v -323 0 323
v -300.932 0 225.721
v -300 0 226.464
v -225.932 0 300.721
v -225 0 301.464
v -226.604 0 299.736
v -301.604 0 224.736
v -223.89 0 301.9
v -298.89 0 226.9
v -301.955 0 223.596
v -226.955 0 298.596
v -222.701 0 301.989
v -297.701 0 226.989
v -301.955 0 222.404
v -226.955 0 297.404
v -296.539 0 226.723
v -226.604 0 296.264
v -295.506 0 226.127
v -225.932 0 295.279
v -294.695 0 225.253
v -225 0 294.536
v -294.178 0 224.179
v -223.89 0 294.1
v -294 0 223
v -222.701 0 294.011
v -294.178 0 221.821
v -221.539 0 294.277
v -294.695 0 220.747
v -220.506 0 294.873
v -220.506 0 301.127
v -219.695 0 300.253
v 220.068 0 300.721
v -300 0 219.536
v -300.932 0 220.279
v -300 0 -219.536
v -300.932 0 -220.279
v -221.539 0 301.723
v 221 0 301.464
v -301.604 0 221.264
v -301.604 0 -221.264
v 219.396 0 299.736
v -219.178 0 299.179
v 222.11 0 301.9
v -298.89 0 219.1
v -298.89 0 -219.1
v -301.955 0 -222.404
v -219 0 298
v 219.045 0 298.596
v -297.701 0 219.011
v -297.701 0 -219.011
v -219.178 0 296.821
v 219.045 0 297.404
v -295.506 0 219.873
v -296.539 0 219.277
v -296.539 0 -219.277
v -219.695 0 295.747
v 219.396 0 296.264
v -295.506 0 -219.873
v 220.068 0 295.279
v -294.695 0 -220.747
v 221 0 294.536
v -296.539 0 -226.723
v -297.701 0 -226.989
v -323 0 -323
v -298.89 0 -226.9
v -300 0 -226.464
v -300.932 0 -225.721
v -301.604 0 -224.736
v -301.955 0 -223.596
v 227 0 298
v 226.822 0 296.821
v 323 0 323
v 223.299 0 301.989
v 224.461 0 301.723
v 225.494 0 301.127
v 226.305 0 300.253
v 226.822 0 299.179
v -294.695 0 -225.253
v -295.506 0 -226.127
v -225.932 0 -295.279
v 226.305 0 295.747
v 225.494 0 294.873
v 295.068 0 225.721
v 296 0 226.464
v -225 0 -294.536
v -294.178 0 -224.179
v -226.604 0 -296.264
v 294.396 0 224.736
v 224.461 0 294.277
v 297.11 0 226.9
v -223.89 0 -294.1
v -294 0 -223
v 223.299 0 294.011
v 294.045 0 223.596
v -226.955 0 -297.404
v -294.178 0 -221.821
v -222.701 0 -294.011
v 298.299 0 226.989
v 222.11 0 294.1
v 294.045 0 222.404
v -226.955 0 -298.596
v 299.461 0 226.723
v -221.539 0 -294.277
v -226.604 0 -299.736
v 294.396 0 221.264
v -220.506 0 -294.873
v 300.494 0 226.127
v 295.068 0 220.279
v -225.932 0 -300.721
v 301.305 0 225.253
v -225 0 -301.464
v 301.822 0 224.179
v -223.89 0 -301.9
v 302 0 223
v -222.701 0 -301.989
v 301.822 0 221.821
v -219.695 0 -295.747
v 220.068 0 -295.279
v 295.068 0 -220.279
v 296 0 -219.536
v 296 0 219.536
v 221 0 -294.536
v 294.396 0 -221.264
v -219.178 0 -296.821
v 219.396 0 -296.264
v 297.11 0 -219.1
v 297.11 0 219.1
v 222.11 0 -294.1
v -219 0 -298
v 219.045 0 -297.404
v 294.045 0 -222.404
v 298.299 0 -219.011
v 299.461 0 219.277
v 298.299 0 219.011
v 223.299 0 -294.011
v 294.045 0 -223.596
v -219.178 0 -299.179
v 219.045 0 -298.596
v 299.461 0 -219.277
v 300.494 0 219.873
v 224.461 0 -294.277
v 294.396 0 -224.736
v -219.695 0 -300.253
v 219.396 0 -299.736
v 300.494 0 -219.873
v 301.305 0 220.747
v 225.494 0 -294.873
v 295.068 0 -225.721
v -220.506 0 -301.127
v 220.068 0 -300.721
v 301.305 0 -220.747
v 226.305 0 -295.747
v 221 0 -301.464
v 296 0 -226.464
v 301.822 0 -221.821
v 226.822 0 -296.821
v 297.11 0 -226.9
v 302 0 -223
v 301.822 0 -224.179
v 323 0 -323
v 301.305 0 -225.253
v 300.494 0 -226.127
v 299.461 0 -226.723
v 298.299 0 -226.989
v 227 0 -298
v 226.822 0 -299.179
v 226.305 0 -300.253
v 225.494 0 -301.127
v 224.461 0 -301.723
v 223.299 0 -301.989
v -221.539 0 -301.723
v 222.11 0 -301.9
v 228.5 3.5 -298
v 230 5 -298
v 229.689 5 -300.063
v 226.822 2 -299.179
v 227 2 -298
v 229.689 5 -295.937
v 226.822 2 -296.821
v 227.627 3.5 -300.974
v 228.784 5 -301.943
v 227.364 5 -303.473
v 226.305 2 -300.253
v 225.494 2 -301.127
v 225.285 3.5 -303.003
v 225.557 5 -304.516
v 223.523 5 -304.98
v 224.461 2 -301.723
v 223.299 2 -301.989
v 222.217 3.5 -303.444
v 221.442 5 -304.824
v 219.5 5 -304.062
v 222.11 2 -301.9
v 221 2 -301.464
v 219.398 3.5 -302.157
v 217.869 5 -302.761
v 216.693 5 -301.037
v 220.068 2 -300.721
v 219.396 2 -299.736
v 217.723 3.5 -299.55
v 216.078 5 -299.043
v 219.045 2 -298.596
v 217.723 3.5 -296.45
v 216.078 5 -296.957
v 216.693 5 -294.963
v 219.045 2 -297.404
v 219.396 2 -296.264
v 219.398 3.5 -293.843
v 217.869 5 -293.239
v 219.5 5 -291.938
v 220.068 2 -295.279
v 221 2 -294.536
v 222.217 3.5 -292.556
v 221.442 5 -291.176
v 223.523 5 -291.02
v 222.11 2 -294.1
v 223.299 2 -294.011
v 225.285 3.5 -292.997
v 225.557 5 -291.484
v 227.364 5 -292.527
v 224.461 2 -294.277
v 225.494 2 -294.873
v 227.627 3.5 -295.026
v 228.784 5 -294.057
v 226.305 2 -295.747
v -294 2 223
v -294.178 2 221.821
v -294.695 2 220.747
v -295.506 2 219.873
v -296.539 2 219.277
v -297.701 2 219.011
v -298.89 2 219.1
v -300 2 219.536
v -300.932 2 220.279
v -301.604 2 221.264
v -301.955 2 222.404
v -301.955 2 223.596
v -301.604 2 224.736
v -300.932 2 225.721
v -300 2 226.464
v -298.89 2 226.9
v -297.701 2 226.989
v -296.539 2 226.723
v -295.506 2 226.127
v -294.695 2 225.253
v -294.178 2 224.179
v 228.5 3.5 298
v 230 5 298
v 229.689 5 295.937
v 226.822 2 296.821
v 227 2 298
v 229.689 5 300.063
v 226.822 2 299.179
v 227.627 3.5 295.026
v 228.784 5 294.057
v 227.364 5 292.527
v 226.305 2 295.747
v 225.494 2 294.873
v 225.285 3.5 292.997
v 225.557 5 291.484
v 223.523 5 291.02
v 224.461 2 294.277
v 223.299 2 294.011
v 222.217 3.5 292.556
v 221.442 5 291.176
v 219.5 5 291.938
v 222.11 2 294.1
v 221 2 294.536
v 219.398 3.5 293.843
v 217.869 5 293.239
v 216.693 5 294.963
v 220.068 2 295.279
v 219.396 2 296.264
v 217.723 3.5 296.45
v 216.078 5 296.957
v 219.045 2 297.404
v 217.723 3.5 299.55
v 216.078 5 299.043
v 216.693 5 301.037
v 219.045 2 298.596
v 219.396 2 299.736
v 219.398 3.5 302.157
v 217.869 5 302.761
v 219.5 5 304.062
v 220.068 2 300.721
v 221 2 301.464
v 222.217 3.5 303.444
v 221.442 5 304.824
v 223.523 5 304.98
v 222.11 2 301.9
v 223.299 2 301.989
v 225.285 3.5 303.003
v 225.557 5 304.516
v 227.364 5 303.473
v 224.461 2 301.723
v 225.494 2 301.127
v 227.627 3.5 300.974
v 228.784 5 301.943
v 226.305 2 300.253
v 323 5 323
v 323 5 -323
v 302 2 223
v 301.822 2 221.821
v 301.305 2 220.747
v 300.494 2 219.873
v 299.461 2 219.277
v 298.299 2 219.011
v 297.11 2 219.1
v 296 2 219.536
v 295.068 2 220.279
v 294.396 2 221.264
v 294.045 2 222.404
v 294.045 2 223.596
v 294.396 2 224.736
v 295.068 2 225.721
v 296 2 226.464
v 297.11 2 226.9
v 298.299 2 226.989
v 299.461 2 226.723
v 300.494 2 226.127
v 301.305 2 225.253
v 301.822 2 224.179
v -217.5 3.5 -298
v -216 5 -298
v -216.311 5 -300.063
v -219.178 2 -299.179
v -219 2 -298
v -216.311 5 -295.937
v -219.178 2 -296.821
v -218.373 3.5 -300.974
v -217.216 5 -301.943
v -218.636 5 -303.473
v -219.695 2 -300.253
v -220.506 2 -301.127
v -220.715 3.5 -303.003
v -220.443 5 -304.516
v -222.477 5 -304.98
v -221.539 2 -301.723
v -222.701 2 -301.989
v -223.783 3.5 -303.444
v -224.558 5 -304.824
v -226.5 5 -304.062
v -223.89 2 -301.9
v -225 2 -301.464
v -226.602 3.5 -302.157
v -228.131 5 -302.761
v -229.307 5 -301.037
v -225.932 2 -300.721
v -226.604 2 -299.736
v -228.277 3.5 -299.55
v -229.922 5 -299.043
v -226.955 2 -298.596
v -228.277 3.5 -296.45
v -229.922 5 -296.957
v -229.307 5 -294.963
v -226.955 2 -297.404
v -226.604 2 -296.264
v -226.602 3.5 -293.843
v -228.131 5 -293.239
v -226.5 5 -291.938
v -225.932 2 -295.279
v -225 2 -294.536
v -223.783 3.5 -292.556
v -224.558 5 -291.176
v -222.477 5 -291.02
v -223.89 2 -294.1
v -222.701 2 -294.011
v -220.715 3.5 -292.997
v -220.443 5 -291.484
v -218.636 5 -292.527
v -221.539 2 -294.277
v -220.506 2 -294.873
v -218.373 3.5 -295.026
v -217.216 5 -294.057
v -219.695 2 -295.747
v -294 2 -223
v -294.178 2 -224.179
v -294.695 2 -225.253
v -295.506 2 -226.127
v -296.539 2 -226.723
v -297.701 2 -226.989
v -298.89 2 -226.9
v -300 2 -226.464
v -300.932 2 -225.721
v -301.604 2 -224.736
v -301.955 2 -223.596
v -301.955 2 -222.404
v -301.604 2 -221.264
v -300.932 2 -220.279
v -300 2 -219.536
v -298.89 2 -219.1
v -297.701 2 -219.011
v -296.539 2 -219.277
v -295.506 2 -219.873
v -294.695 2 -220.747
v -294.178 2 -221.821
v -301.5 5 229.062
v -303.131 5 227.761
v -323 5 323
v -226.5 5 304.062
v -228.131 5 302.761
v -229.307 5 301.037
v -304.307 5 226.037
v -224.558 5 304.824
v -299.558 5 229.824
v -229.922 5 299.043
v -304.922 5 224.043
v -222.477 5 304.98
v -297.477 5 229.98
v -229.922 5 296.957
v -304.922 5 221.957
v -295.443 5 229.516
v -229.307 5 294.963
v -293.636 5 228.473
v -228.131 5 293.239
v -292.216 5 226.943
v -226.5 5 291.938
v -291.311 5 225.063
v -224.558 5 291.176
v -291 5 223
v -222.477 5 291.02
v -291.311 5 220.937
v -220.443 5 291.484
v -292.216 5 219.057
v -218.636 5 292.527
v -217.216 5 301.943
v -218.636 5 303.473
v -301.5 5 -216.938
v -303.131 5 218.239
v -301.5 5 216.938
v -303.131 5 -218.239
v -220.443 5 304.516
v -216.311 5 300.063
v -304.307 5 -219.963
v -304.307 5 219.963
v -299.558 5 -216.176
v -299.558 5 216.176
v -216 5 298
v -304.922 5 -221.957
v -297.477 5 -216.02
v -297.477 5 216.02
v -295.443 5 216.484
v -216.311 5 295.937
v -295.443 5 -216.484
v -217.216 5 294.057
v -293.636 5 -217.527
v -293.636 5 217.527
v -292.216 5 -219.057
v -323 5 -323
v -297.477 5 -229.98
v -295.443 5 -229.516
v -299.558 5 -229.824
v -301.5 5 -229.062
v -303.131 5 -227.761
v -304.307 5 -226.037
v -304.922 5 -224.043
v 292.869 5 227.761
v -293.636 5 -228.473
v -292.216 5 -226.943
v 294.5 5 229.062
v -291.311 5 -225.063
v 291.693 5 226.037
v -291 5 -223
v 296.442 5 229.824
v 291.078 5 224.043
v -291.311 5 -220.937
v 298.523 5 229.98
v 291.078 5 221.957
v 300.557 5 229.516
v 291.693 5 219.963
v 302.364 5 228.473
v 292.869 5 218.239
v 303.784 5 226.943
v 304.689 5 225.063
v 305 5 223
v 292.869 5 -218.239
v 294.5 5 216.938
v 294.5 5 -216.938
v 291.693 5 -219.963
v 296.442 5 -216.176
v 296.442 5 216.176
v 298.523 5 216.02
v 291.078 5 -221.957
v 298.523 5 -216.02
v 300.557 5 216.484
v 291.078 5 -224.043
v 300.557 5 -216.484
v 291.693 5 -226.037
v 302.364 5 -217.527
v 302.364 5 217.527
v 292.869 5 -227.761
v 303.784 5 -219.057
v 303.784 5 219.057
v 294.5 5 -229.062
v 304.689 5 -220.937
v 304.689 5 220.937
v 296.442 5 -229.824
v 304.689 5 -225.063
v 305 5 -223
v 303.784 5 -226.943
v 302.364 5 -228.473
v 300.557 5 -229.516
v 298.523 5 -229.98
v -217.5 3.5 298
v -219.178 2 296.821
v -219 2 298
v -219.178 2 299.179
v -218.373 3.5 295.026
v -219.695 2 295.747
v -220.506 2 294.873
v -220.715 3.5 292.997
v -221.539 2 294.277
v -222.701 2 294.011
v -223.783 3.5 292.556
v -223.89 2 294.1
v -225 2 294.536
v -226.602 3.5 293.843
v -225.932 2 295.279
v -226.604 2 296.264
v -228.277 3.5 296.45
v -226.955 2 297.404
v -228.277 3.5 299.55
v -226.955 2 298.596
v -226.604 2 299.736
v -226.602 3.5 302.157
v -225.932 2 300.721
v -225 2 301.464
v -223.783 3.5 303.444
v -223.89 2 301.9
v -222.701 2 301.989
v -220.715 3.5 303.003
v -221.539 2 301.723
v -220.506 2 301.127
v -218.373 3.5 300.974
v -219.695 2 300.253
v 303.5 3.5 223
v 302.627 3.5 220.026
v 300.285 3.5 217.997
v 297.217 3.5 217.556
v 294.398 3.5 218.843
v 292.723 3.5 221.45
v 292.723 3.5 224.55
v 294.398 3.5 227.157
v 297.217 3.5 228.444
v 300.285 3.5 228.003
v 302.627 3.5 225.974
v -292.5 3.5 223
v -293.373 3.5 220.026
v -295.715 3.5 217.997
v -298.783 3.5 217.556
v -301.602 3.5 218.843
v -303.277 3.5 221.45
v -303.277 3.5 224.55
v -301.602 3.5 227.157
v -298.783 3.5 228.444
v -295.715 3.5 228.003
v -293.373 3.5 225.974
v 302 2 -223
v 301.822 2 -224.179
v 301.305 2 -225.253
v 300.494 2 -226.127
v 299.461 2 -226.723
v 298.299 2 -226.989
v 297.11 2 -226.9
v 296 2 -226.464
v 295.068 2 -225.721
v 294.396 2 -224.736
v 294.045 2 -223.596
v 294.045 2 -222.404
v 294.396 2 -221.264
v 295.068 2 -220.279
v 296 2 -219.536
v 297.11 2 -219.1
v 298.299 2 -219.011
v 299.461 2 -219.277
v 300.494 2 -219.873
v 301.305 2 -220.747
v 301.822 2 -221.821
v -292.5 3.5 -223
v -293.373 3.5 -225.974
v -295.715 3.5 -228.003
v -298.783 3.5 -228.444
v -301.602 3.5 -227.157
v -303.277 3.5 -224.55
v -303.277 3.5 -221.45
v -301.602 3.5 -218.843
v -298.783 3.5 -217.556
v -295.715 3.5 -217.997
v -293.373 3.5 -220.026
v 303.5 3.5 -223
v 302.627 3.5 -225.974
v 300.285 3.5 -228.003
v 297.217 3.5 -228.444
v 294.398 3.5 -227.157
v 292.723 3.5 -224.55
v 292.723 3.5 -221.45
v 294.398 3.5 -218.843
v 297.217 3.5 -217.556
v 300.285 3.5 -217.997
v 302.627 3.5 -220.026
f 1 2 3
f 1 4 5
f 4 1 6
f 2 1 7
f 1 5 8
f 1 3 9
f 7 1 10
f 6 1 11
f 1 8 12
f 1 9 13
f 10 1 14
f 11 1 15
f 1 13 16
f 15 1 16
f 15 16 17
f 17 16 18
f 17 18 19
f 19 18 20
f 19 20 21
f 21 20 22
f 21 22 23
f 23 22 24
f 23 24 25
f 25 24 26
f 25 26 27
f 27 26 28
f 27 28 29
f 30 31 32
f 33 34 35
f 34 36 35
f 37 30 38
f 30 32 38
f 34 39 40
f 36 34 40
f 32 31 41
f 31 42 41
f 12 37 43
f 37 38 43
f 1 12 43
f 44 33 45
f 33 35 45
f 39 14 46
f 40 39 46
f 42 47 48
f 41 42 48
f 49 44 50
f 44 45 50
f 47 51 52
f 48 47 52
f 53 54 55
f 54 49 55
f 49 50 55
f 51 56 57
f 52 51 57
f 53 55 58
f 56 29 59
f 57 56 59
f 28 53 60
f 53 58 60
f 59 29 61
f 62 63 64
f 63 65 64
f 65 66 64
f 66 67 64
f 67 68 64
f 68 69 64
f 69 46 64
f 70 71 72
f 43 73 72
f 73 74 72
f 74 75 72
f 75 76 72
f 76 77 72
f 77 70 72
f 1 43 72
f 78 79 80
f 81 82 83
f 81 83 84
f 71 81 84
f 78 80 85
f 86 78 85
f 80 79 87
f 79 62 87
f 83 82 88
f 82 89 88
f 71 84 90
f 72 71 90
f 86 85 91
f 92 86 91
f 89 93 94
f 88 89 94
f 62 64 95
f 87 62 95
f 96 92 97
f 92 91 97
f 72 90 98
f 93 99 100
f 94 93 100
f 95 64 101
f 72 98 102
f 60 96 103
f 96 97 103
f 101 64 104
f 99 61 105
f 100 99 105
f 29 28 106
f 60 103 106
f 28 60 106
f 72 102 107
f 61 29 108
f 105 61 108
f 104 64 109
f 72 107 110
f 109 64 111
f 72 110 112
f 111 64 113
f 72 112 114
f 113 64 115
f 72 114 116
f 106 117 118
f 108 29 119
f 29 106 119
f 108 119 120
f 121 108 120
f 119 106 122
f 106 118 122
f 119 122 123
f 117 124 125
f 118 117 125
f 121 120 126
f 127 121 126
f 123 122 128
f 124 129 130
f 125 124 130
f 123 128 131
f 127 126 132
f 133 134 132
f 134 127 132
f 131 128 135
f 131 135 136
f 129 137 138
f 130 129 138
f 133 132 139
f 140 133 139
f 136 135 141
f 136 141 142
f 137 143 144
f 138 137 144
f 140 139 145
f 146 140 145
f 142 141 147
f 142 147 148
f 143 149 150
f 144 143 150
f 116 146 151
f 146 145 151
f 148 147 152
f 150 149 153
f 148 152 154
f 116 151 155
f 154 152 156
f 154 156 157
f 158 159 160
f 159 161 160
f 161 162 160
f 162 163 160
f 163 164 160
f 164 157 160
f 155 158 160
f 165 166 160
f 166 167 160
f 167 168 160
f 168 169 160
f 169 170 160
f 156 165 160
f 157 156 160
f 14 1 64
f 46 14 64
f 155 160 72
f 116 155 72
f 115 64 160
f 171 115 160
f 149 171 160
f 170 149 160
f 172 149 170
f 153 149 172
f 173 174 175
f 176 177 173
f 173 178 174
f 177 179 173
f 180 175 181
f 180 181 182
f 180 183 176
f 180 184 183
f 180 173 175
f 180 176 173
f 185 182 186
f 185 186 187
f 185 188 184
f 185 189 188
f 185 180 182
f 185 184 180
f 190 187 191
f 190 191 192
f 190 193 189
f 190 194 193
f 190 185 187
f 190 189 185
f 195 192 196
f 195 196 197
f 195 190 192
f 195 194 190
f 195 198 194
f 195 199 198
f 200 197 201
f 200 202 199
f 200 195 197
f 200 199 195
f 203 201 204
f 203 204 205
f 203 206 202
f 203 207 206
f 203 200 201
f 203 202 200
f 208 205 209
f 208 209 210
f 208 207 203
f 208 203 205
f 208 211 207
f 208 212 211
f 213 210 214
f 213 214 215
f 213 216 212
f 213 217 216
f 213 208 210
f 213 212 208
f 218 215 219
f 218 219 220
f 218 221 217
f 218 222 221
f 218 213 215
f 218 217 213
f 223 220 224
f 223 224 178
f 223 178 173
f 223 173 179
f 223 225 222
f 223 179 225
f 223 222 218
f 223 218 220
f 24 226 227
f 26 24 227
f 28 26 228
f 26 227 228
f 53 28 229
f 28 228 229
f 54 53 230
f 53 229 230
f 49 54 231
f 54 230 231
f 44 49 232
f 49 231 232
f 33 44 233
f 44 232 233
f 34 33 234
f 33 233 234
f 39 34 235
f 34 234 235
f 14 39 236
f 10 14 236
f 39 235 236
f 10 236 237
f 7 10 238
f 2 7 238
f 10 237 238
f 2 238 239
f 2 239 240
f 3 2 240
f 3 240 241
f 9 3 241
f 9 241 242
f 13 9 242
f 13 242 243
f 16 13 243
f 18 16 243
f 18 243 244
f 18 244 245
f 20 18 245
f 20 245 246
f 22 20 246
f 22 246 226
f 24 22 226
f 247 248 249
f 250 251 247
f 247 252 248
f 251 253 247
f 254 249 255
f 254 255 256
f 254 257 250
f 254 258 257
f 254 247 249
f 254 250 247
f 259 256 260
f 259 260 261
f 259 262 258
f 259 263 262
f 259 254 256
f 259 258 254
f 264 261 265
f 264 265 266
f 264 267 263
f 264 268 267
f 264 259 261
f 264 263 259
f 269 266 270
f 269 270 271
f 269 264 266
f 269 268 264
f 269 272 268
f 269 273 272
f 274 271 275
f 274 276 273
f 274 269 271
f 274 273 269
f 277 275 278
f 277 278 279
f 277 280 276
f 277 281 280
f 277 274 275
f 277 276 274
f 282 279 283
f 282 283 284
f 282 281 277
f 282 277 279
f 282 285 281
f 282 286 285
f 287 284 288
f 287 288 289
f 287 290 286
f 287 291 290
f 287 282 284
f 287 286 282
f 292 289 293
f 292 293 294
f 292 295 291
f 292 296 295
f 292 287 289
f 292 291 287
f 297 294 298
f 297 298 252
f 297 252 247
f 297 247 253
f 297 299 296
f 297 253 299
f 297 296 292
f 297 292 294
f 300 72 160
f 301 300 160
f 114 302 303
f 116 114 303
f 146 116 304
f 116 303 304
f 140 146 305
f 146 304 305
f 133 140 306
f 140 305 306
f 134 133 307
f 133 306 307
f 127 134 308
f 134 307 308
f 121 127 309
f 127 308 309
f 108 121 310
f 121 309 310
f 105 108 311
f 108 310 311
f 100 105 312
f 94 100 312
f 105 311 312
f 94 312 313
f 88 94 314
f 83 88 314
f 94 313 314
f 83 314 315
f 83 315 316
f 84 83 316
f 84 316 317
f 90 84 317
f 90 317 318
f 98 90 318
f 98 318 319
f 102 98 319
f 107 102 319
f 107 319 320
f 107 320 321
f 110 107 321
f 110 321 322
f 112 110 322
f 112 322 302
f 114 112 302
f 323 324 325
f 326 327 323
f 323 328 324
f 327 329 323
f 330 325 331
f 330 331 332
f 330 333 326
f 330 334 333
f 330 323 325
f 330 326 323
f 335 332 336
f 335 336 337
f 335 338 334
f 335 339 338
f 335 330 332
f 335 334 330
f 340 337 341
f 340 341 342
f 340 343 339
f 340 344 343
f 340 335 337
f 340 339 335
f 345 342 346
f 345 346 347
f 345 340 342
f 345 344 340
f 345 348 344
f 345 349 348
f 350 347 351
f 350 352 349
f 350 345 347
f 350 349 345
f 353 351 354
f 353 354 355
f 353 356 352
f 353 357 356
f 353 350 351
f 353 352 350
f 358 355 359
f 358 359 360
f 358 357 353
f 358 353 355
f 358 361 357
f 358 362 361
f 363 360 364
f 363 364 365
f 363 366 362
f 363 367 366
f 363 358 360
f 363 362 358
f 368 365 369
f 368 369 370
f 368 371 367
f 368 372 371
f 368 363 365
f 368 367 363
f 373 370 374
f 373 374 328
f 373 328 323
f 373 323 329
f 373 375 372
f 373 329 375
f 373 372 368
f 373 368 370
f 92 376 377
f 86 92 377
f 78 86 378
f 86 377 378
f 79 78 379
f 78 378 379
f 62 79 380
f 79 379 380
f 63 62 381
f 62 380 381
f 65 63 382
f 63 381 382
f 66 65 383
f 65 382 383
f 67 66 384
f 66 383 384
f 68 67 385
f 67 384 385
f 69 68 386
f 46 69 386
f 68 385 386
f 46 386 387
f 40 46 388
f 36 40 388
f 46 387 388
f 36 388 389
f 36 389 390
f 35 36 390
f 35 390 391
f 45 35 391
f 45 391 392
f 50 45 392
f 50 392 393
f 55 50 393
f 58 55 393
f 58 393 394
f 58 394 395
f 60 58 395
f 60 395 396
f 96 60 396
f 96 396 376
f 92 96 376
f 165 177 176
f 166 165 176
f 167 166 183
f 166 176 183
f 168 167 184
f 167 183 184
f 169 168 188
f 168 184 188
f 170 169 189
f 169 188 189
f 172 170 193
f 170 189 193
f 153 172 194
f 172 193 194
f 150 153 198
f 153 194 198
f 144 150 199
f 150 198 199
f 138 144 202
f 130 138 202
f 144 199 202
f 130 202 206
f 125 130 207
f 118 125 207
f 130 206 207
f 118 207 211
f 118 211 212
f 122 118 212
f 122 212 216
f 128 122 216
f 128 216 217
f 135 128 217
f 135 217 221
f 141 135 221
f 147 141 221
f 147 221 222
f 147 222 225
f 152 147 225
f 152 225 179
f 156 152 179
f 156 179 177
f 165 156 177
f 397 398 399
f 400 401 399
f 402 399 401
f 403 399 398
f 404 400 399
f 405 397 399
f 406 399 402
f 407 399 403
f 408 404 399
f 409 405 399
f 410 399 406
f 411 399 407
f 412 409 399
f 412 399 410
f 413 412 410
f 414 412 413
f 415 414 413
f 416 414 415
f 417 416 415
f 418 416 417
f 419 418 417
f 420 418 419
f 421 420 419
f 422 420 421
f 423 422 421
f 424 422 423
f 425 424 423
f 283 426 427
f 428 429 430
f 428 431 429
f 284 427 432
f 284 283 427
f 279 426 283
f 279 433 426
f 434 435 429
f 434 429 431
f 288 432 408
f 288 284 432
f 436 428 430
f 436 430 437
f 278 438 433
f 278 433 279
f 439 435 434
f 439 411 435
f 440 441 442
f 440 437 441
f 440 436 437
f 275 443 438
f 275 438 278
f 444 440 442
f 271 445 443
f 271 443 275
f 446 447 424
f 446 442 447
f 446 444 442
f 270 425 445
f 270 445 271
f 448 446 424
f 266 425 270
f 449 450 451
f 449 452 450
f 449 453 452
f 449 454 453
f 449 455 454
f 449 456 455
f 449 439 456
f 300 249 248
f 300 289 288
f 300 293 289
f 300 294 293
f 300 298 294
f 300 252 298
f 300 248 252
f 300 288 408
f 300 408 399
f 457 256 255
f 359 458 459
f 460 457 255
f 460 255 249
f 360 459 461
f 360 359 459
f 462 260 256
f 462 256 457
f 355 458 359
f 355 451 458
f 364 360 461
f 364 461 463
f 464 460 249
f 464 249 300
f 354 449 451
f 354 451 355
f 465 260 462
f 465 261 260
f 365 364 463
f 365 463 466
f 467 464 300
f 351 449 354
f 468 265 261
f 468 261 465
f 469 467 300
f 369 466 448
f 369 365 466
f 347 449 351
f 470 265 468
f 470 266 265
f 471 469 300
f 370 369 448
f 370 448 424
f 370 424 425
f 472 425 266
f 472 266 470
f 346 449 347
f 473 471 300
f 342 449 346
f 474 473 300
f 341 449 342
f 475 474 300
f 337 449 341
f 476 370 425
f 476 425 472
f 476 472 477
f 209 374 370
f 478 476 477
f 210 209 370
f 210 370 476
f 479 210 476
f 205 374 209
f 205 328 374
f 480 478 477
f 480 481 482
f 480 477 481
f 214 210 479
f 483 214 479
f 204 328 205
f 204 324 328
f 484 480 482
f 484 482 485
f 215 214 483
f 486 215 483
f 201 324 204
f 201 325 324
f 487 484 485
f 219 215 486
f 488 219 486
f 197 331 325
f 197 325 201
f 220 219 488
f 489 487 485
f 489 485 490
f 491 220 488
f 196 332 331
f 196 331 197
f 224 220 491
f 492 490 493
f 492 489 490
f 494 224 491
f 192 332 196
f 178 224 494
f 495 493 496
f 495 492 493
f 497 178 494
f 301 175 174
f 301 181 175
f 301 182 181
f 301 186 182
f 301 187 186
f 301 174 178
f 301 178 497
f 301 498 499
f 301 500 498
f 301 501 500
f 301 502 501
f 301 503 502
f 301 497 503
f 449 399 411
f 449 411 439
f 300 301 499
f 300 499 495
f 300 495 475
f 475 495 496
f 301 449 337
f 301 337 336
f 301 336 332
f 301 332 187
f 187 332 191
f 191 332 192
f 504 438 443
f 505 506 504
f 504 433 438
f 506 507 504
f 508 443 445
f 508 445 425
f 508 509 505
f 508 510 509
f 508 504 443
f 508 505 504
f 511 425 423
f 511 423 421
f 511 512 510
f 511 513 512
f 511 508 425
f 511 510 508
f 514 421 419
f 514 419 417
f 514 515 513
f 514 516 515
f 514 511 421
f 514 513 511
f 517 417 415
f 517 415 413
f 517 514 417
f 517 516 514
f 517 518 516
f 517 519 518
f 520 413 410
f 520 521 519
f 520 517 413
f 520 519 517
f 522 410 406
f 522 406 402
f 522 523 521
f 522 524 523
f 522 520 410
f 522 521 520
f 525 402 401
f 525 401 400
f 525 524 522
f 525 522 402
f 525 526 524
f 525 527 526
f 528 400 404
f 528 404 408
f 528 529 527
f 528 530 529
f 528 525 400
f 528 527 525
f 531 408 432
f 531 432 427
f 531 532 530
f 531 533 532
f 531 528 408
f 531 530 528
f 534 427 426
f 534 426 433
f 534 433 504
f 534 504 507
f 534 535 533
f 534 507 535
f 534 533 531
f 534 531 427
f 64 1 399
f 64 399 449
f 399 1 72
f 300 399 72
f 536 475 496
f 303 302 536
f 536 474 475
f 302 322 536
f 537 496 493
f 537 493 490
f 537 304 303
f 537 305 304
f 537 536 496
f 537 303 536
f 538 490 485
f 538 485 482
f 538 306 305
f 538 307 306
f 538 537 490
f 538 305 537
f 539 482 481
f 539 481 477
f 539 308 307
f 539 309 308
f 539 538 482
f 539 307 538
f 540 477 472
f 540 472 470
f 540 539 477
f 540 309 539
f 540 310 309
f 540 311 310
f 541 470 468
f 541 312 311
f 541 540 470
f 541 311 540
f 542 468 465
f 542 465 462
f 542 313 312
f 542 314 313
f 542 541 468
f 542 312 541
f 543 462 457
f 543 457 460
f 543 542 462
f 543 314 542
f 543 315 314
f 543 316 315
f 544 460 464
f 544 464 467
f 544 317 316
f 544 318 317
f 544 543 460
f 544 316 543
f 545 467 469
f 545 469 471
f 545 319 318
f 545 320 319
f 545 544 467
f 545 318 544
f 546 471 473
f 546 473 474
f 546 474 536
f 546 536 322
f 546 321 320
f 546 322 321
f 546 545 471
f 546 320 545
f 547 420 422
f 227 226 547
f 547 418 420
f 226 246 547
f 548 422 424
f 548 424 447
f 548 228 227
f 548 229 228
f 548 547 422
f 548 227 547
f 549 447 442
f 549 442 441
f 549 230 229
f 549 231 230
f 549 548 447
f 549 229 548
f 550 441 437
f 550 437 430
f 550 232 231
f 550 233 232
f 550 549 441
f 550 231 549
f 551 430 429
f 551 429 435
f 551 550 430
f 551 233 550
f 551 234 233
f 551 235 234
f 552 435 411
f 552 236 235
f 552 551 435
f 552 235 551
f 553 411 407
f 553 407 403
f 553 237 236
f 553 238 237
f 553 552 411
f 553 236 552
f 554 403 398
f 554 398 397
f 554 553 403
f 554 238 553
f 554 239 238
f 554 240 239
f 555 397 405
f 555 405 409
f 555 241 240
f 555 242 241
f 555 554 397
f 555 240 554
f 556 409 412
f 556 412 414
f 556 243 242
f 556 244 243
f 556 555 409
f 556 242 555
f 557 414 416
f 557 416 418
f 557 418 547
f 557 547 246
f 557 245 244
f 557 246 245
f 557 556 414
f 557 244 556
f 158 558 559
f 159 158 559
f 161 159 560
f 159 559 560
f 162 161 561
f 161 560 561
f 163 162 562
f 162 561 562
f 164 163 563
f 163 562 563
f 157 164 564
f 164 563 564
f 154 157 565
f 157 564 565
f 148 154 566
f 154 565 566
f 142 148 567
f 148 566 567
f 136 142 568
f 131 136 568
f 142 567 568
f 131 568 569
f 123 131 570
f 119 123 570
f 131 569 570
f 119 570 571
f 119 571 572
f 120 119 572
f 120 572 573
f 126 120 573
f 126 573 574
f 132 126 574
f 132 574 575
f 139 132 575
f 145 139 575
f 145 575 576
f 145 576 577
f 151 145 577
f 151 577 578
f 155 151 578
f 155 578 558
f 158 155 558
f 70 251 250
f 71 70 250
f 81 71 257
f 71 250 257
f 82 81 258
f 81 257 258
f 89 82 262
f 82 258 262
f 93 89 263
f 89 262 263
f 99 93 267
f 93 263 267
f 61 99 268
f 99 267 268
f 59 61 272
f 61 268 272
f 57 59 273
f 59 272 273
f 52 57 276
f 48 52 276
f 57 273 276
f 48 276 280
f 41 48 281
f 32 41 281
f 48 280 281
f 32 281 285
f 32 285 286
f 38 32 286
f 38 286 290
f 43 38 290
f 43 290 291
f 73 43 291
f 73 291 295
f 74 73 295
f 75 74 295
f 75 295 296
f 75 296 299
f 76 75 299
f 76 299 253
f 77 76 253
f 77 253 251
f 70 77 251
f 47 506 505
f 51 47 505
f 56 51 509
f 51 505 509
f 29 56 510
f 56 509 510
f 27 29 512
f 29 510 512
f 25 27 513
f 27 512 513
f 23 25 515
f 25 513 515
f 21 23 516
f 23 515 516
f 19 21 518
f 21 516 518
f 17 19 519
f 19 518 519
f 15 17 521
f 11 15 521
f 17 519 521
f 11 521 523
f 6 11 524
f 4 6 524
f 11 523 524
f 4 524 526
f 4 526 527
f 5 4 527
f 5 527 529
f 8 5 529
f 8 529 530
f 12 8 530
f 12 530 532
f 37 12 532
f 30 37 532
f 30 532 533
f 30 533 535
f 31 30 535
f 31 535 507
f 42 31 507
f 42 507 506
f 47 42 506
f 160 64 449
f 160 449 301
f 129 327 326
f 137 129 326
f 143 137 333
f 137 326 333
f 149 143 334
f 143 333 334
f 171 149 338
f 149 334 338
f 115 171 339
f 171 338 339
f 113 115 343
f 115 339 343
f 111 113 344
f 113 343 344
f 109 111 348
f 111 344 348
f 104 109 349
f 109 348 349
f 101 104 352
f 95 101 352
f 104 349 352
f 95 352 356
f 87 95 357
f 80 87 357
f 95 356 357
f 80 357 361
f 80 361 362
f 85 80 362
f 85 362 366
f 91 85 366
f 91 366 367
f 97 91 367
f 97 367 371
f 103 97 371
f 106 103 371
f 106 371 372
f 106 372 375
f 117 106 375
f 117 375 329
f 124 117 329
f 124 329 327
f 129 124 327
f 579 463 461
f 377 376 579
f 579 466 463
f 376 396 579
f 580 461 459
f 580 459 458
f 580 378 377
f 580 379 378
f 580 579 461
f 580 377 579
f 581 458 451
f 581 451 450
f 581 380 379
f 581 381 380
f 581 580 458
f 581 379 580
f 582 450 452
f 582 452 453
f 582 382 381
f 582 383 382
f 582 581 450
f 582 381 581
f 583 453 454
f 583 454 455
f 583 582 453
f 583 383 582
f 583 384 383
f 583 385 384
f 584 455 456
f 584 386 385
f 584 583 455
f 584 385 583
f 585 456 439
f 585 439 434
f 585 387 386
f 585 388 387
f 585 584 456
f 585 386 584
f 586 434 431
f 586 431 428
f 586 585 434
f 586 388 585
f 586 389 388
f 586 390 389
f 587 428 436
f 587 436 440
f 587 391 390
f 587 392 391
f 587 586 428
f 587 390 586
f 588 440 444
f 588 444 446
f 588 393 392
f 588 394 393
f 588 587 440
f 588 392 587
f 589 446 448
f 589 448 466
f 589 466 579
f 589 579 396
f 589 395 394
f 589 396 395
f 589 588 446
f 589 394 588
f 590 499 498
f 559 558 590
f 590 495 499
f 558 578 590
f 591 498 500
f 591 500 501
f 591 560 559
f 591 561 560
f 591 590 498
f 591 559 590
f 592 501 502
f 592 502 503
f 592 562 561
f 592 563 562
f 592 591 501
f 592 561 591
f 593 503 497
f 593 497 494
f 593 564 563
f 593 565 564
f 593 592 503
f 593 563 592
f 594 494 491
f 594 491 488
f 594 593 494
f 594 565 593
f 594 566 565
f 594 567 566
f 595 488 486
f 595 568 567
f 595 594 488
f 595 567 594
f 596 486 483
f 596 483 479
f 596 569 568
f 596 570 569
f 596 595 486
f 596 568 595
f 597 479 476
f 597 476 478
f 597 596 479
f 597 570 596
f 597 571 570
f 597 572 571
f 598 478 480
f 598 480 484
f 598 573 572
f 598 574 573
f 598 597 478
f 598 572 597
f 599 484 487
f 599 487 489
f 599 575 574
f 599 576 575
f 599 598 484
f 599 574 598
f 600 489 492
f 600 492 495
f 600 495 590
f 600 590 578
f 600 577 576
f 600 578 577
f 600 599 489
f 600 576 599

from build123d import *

# Parameters (mm, degrees)
SKETCH1_W           = 646
SKETCH1_H           = 646
BOSS_EXTRUDE1_DEPTH = 5
SKETCH2_R           = 4
CUT_EXTRUDE1_DEPTH  = 6
CHAMFER1_SIZE       = 3


with BuildPart() as part:
    # Sketch1 → Boss-Extrude1 (new body)
    with BuildSketch(Plane(origin=(0, 0, 0), x_dir=(1, 0, 0), z_dir=(0, 1, 0))):
        Rectangle(SKETCH1_W, SKETCH1_H)
    extrude(amount=BOSS_EXTRUDE1_DEPTH)

    # Sketch2 → Cut-Extrude1 (cut, through all)
    with BuildSketch(Plane(origin=(0, 5, 0), x_dir=(1, 0, 0), z_dir=(0, 1, 0))):
        with Locations((-223, -298)):
            Circle(SKETCH2_R)
        with Locations((223, -298)):
            Circle(SKETCH2_R)
        with Locations((-298, -223)):
            Circle(SKETCH2_R)
        with Locations((298, -223)):
            Circle(SKETCH2_R)
        with Locations((298, 223)):
            Circle(SKETCH2_R)
        with Locations((223, 298)):
            Circle(SKETCH2_R)
        with Locations((-223, 298)):
            Circle(SKETCH2_R)
        with Locations((-298, 223)):
            Circle(SKETCH2_R)
    extrude(amount=-CUT_EXTRUDE1_DEPTH, mode=Mode.SUBTRACT)

    # Chamfer1
    chamfer1_edges = [part.edges().sort_by_distance(p)[0] for p in [
        (-227, 5, 298),
        (219, 5, 298),
        (-302, 5, 223),
        (294, 5, 223),
        (294, 5, -223),
        (219, 5, -298),
        (-227, 5, -298),
        (-302, 5, -223),
    ]]
    chamfer(chamfer1_edges, length=CHAMFER1_SIZE)


solid = part.part
